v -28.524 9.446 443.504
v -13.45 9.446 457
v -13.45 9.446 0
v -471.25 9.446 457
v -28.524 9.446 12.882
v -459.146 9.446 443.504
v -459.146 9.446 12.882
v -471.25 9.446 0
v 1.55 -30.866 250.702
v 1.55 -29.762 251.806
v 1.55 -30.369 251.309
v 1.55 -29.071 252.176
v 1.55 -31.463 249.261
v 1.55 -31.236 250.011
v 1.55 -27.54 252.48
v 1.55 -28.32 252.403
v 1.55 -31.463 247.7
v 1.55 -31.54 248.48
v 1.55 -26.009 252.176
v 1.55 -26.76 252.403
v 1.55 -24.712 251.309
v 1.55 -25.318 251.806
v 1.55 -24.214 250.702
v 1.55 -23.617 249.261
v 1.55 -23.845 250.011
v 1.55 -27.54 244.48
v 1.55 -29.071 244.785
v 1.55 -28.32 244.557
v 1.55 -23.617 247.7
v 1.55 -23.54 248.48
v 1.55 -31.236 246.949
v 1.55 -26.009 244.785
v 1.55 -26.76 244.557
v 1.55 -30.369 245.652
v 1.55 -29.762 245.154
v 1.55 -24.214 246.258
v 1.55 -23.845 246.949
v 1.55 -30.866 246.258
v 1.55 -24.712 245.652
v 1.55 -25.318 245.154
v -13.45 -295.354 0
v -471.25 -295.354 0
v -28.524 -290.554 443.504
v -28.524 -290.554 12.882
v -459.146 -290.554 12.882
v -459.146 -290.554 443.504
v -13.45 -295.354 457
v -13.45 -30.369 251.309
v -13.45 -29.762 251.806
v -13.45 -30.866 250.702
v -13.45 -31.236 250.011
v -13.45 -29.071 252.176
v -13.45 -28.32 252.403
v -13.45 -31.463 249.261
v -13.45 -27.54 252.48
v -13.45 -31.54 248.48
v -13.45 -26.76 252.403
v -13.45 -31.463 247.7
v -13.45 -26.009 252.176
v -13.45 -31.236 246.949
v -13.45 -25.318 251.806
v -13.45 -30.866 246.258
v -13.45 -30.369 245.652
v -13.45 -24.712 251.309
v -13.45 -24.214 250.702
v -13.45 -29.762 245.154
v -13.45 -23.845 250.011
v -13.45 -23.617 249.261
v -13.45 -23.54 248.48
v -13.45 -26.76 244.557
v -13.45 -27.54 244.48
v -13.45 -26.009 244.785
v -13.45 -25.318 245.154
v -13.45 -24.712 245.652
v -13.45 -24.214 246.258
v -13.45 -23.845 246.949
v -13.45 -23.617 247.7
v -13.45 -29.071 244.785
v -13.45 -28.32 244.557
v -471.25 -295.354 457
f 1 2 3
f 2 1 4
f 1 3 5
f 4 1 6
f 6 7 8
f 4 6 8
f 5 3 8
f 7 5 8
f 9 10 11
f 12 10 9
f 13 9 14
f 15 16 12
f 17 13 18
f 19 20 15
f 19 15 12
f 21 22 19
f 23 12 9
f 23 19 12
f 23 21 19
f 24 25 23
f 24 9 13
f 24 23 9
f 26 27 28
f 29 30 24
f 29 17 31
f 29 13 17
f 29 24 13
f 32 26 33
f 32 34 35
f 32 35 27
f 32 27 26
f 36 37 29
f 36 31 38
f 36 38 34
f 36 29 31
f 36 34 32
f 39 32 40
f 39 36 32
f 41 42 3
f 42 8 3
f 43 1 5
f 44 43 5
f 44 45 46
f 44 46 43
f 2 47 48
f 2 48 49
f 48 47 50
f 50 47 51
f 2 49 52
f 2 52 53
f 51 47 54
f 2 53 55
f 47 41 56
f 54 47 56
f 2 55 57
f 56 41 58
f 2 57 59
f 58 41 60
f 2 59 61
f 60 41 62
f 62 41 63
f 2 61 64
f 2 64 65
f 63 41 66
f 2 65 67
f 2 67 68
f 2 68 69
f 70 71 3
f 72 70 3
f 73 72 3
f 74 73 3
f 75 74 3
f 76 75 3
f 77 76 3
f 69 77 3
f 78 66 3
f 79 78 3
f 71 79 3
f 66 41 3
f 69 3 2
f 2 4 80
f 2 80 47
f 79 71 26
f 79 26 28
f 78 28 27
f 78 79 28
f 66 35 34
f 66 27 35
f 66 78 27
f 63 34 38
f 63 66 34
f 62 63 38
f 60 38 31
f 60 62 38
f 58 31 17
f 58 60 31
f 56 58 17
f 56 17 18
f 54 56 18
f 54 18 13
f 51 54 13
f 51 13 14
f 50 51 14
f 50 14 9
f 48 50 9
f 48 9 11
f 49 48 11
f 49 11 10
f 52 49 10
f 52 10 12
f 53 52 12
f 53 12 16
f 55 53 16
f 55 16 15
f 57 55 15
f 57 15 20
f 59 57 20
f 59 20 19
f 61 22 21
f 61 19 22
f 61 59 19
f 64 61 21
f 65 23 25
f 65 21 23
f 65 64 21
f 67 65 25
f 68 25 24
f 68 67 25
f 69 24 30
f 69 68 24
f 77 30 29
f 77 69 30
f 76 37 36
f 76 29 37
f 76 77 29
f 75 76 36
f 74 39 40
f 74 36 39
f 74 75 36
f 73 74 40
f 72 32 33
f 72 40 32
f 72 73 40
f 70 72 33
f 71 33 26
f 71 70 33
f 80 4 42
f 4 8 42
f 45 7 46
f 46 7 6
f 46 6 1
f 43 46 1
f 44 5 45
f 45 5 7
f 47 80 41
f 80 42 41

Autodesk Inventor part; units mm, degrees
ref_plane "YZ Plane" through (0, 0, 0) normal (1, 0, 0) x (0, 1, 0)
ref_plane "XZ Plane" through (0, 0, 0) normal (0, 1, 0) x (-1, 0, 0)
ref_plane "XY Plane" through (0, 0, 0) normal (0, 0, 1) x (1, 0, 0)
sketch "Sketch1" plane through (0, 0, 0) normal (0, 0, 1) x (1, 0, 0)
  line L0 (-13.4502, 9.4461) -> (-471.2502, 9.4461)
  line L1 (-471.2502, 9.4461) -> (-471.2502, -295.3539)
  line L2 (-471.2502, -295.3539) -> (-13.4502, -295.3539)
  line L3 (-13.4502, -295.3539) -> (-13.4502, 9.4461)
  point P0 (0, 0)
  dimension "d0" = 457.8
  dimension "d1" = 304.8
extrude "Extrusion1" add sketch "Sketch1" along normal blind 457
sketch "Sketch2" plane through (-471.2502, 9.4461, 0) normal (0, 1, 0) x (1, 0, 0)
  line L0 (12.104, -443.504) -> (442.7261, -443.504)
  line L1 (442.7261, -443.504) -> (442.7261, -12.8819)
  line L2 (442.7261, -12.8819) -> (12.104, -12.8819)
  line L3 (12.104, -12.8819) -> (12.104, -443.504)
  point P0 (471.2502, 0)
extrude "Extrusion2" cut sketch "Sketch2" against normal blind 300
sketch "Sketch3" plane through (-13.4502, -295.3539, 0) normal (1, 0, 0) x (0, 0, -1)
  circle A0 centre (-248.4802, 267.8138) radius 4
  point P0 (0, 295.3539)
  dimension "d6" = 8
extrude "Extrusion3" add sketch "Sketch3" along normal blind 15
properties part number "outerbox"
